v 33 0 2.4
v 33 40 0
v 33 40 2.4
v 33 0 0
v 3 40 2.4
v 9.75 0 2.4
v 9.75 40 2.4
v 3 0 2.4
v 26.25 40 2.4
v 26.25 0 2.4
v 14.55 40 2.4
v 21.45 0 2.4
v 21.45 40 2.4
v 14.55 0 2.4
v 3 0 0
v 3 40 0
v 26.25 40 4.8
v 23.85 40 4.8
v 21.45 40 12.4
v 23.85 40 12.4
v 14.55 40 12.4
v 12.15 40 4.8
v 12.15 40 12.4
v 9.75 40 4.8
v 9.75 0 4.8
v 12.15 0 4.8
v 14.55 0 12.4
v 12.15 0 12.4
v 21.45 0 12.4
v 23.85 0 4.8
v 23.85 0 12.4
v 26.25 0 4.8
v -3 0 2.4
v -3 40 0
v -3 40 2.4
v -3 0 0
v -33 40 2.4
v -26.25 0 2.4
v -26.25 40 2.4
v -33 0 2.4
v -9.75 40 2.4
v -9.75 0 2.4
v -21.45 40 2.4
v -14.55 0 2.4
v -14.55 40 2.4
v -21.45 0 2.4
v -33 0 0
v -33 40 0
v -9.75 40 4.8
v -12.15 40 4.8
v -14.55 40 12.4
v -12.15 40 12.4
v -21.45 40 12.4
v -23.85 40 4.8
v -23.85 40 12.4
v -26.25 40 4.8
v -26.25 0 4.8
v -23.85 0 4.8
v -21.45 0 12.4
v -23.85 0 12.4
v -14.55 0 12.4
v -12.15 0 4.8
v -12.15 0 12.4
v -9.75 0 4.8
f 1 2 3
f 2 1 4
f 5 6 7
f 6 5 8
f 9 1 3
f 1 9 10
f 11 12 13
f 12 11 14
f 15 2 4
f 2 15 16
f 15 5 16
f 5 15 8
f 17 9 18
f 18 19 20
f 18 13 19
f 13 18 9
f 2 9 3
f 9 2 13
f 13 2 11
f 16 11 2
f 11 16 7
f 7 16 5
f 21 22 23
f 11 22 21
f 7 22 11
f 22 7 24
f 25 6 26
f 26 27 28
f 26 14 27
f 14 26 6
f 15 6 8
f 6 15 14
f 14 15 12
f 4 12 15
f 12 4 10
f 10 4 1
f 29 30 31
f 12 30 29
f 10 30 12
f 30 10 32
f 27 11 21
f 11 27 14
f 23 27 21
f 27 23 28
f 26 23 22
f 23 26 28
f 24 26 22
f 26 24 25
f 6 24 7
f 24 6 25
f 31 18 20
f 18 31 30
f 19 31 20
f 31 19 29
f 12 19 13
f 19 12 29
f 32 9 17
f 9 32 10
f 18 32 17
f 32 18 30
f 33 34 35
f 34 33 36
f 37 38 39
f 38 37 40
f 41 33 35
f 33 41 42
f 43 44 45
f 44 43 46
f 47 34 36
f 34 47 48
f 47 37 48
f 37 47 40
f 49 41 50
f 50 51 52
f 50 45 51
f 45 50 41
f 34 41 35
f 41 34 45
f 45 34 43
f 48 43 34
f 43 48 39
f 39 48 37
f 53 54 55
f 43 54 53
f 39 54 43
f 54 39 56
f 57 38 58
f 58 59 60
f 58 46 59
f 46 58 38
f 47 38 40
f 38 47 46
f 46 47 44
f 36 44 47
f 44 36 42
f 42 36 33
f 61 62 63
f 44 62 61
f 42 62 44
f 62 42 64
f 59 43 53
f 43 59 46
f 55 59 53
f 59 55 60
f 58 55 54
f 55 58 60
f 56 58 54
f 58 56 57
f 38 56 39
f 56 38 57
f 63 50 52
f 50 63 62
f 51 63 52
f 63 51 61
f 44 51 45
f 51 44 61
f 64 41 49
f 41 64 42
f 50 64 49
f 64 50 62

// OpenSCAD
wood_thick = 6.9;
width = 30;
length = 40; //138/2;
thick = 2.4;

module part(){
    cube([width, length, thick]);

    offset = width/2-thick;

    translate([offset-wood_thick/2, 0, thick]) cube([thick,length,width/3]);
    translate([offset-wood_thick/2-thick, 0, thick]) cube([thick,length,thick]);

    translate([offset+wood_thick/2+thick,0,thick]) cube([thick,length,width/3]);
    translate([offset+wood_thick/2+2*thick,0,thick]) cube([thick,length,thick]);
}

sep = 3;
translate([sep,0,0]) part();
translate([-(sep+width),0,0]) part();
